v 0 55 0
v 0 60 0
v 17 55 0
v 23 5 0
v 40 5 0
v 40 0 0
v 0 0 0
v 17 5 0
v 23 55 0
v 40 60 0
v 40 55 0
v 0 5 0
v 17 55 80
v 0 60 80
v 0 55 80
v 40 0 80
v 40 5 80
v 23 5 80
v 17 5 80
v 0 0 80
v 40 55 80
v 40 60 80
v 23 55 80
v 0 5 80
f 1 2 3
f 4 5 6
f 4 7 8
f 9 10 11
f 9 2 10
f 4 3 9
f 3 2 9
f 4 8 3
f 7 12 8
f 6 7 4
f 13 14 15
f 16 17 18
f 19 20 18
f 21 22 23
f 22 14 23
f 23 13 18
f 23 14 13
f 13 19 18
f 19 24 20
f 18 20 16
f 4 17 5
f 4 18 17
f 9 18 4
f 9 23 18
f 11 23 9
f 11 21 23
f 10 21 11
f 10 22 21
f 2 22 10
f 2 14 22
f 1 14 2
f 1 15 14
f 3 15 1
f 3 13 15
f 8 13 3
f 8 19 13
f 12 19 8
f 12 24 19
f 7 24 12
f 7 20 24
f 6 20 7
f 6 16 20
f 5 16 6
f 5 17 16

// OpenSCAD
$fn = 32;

// ----------------------------------------------------------------------
// Structural section: ibeam 40 x 60 mm
// ----------------------------------------------------------------------

// --- parameters (mm) ---
sec_w = 40;               // section width, X
sec_h = 60;               // section height, Y
flange_t = 5;             // flange thickness
web_t = 6;                // web thickness
plate_t = 80;             // cut length, Z (extrusion height)

profile = [[0, 0], [40, 0], [40, 5], [23, 5], [23, 55], [40, 55], [40, 60], [0, 60], [0, 55], [17, 55], [17, 5], [0, 5]];  // primary outline, 12 points, counter clockwise

// --- the one profile operation ---
linear_extrude(height = plate_t) polygon(points = profile);
